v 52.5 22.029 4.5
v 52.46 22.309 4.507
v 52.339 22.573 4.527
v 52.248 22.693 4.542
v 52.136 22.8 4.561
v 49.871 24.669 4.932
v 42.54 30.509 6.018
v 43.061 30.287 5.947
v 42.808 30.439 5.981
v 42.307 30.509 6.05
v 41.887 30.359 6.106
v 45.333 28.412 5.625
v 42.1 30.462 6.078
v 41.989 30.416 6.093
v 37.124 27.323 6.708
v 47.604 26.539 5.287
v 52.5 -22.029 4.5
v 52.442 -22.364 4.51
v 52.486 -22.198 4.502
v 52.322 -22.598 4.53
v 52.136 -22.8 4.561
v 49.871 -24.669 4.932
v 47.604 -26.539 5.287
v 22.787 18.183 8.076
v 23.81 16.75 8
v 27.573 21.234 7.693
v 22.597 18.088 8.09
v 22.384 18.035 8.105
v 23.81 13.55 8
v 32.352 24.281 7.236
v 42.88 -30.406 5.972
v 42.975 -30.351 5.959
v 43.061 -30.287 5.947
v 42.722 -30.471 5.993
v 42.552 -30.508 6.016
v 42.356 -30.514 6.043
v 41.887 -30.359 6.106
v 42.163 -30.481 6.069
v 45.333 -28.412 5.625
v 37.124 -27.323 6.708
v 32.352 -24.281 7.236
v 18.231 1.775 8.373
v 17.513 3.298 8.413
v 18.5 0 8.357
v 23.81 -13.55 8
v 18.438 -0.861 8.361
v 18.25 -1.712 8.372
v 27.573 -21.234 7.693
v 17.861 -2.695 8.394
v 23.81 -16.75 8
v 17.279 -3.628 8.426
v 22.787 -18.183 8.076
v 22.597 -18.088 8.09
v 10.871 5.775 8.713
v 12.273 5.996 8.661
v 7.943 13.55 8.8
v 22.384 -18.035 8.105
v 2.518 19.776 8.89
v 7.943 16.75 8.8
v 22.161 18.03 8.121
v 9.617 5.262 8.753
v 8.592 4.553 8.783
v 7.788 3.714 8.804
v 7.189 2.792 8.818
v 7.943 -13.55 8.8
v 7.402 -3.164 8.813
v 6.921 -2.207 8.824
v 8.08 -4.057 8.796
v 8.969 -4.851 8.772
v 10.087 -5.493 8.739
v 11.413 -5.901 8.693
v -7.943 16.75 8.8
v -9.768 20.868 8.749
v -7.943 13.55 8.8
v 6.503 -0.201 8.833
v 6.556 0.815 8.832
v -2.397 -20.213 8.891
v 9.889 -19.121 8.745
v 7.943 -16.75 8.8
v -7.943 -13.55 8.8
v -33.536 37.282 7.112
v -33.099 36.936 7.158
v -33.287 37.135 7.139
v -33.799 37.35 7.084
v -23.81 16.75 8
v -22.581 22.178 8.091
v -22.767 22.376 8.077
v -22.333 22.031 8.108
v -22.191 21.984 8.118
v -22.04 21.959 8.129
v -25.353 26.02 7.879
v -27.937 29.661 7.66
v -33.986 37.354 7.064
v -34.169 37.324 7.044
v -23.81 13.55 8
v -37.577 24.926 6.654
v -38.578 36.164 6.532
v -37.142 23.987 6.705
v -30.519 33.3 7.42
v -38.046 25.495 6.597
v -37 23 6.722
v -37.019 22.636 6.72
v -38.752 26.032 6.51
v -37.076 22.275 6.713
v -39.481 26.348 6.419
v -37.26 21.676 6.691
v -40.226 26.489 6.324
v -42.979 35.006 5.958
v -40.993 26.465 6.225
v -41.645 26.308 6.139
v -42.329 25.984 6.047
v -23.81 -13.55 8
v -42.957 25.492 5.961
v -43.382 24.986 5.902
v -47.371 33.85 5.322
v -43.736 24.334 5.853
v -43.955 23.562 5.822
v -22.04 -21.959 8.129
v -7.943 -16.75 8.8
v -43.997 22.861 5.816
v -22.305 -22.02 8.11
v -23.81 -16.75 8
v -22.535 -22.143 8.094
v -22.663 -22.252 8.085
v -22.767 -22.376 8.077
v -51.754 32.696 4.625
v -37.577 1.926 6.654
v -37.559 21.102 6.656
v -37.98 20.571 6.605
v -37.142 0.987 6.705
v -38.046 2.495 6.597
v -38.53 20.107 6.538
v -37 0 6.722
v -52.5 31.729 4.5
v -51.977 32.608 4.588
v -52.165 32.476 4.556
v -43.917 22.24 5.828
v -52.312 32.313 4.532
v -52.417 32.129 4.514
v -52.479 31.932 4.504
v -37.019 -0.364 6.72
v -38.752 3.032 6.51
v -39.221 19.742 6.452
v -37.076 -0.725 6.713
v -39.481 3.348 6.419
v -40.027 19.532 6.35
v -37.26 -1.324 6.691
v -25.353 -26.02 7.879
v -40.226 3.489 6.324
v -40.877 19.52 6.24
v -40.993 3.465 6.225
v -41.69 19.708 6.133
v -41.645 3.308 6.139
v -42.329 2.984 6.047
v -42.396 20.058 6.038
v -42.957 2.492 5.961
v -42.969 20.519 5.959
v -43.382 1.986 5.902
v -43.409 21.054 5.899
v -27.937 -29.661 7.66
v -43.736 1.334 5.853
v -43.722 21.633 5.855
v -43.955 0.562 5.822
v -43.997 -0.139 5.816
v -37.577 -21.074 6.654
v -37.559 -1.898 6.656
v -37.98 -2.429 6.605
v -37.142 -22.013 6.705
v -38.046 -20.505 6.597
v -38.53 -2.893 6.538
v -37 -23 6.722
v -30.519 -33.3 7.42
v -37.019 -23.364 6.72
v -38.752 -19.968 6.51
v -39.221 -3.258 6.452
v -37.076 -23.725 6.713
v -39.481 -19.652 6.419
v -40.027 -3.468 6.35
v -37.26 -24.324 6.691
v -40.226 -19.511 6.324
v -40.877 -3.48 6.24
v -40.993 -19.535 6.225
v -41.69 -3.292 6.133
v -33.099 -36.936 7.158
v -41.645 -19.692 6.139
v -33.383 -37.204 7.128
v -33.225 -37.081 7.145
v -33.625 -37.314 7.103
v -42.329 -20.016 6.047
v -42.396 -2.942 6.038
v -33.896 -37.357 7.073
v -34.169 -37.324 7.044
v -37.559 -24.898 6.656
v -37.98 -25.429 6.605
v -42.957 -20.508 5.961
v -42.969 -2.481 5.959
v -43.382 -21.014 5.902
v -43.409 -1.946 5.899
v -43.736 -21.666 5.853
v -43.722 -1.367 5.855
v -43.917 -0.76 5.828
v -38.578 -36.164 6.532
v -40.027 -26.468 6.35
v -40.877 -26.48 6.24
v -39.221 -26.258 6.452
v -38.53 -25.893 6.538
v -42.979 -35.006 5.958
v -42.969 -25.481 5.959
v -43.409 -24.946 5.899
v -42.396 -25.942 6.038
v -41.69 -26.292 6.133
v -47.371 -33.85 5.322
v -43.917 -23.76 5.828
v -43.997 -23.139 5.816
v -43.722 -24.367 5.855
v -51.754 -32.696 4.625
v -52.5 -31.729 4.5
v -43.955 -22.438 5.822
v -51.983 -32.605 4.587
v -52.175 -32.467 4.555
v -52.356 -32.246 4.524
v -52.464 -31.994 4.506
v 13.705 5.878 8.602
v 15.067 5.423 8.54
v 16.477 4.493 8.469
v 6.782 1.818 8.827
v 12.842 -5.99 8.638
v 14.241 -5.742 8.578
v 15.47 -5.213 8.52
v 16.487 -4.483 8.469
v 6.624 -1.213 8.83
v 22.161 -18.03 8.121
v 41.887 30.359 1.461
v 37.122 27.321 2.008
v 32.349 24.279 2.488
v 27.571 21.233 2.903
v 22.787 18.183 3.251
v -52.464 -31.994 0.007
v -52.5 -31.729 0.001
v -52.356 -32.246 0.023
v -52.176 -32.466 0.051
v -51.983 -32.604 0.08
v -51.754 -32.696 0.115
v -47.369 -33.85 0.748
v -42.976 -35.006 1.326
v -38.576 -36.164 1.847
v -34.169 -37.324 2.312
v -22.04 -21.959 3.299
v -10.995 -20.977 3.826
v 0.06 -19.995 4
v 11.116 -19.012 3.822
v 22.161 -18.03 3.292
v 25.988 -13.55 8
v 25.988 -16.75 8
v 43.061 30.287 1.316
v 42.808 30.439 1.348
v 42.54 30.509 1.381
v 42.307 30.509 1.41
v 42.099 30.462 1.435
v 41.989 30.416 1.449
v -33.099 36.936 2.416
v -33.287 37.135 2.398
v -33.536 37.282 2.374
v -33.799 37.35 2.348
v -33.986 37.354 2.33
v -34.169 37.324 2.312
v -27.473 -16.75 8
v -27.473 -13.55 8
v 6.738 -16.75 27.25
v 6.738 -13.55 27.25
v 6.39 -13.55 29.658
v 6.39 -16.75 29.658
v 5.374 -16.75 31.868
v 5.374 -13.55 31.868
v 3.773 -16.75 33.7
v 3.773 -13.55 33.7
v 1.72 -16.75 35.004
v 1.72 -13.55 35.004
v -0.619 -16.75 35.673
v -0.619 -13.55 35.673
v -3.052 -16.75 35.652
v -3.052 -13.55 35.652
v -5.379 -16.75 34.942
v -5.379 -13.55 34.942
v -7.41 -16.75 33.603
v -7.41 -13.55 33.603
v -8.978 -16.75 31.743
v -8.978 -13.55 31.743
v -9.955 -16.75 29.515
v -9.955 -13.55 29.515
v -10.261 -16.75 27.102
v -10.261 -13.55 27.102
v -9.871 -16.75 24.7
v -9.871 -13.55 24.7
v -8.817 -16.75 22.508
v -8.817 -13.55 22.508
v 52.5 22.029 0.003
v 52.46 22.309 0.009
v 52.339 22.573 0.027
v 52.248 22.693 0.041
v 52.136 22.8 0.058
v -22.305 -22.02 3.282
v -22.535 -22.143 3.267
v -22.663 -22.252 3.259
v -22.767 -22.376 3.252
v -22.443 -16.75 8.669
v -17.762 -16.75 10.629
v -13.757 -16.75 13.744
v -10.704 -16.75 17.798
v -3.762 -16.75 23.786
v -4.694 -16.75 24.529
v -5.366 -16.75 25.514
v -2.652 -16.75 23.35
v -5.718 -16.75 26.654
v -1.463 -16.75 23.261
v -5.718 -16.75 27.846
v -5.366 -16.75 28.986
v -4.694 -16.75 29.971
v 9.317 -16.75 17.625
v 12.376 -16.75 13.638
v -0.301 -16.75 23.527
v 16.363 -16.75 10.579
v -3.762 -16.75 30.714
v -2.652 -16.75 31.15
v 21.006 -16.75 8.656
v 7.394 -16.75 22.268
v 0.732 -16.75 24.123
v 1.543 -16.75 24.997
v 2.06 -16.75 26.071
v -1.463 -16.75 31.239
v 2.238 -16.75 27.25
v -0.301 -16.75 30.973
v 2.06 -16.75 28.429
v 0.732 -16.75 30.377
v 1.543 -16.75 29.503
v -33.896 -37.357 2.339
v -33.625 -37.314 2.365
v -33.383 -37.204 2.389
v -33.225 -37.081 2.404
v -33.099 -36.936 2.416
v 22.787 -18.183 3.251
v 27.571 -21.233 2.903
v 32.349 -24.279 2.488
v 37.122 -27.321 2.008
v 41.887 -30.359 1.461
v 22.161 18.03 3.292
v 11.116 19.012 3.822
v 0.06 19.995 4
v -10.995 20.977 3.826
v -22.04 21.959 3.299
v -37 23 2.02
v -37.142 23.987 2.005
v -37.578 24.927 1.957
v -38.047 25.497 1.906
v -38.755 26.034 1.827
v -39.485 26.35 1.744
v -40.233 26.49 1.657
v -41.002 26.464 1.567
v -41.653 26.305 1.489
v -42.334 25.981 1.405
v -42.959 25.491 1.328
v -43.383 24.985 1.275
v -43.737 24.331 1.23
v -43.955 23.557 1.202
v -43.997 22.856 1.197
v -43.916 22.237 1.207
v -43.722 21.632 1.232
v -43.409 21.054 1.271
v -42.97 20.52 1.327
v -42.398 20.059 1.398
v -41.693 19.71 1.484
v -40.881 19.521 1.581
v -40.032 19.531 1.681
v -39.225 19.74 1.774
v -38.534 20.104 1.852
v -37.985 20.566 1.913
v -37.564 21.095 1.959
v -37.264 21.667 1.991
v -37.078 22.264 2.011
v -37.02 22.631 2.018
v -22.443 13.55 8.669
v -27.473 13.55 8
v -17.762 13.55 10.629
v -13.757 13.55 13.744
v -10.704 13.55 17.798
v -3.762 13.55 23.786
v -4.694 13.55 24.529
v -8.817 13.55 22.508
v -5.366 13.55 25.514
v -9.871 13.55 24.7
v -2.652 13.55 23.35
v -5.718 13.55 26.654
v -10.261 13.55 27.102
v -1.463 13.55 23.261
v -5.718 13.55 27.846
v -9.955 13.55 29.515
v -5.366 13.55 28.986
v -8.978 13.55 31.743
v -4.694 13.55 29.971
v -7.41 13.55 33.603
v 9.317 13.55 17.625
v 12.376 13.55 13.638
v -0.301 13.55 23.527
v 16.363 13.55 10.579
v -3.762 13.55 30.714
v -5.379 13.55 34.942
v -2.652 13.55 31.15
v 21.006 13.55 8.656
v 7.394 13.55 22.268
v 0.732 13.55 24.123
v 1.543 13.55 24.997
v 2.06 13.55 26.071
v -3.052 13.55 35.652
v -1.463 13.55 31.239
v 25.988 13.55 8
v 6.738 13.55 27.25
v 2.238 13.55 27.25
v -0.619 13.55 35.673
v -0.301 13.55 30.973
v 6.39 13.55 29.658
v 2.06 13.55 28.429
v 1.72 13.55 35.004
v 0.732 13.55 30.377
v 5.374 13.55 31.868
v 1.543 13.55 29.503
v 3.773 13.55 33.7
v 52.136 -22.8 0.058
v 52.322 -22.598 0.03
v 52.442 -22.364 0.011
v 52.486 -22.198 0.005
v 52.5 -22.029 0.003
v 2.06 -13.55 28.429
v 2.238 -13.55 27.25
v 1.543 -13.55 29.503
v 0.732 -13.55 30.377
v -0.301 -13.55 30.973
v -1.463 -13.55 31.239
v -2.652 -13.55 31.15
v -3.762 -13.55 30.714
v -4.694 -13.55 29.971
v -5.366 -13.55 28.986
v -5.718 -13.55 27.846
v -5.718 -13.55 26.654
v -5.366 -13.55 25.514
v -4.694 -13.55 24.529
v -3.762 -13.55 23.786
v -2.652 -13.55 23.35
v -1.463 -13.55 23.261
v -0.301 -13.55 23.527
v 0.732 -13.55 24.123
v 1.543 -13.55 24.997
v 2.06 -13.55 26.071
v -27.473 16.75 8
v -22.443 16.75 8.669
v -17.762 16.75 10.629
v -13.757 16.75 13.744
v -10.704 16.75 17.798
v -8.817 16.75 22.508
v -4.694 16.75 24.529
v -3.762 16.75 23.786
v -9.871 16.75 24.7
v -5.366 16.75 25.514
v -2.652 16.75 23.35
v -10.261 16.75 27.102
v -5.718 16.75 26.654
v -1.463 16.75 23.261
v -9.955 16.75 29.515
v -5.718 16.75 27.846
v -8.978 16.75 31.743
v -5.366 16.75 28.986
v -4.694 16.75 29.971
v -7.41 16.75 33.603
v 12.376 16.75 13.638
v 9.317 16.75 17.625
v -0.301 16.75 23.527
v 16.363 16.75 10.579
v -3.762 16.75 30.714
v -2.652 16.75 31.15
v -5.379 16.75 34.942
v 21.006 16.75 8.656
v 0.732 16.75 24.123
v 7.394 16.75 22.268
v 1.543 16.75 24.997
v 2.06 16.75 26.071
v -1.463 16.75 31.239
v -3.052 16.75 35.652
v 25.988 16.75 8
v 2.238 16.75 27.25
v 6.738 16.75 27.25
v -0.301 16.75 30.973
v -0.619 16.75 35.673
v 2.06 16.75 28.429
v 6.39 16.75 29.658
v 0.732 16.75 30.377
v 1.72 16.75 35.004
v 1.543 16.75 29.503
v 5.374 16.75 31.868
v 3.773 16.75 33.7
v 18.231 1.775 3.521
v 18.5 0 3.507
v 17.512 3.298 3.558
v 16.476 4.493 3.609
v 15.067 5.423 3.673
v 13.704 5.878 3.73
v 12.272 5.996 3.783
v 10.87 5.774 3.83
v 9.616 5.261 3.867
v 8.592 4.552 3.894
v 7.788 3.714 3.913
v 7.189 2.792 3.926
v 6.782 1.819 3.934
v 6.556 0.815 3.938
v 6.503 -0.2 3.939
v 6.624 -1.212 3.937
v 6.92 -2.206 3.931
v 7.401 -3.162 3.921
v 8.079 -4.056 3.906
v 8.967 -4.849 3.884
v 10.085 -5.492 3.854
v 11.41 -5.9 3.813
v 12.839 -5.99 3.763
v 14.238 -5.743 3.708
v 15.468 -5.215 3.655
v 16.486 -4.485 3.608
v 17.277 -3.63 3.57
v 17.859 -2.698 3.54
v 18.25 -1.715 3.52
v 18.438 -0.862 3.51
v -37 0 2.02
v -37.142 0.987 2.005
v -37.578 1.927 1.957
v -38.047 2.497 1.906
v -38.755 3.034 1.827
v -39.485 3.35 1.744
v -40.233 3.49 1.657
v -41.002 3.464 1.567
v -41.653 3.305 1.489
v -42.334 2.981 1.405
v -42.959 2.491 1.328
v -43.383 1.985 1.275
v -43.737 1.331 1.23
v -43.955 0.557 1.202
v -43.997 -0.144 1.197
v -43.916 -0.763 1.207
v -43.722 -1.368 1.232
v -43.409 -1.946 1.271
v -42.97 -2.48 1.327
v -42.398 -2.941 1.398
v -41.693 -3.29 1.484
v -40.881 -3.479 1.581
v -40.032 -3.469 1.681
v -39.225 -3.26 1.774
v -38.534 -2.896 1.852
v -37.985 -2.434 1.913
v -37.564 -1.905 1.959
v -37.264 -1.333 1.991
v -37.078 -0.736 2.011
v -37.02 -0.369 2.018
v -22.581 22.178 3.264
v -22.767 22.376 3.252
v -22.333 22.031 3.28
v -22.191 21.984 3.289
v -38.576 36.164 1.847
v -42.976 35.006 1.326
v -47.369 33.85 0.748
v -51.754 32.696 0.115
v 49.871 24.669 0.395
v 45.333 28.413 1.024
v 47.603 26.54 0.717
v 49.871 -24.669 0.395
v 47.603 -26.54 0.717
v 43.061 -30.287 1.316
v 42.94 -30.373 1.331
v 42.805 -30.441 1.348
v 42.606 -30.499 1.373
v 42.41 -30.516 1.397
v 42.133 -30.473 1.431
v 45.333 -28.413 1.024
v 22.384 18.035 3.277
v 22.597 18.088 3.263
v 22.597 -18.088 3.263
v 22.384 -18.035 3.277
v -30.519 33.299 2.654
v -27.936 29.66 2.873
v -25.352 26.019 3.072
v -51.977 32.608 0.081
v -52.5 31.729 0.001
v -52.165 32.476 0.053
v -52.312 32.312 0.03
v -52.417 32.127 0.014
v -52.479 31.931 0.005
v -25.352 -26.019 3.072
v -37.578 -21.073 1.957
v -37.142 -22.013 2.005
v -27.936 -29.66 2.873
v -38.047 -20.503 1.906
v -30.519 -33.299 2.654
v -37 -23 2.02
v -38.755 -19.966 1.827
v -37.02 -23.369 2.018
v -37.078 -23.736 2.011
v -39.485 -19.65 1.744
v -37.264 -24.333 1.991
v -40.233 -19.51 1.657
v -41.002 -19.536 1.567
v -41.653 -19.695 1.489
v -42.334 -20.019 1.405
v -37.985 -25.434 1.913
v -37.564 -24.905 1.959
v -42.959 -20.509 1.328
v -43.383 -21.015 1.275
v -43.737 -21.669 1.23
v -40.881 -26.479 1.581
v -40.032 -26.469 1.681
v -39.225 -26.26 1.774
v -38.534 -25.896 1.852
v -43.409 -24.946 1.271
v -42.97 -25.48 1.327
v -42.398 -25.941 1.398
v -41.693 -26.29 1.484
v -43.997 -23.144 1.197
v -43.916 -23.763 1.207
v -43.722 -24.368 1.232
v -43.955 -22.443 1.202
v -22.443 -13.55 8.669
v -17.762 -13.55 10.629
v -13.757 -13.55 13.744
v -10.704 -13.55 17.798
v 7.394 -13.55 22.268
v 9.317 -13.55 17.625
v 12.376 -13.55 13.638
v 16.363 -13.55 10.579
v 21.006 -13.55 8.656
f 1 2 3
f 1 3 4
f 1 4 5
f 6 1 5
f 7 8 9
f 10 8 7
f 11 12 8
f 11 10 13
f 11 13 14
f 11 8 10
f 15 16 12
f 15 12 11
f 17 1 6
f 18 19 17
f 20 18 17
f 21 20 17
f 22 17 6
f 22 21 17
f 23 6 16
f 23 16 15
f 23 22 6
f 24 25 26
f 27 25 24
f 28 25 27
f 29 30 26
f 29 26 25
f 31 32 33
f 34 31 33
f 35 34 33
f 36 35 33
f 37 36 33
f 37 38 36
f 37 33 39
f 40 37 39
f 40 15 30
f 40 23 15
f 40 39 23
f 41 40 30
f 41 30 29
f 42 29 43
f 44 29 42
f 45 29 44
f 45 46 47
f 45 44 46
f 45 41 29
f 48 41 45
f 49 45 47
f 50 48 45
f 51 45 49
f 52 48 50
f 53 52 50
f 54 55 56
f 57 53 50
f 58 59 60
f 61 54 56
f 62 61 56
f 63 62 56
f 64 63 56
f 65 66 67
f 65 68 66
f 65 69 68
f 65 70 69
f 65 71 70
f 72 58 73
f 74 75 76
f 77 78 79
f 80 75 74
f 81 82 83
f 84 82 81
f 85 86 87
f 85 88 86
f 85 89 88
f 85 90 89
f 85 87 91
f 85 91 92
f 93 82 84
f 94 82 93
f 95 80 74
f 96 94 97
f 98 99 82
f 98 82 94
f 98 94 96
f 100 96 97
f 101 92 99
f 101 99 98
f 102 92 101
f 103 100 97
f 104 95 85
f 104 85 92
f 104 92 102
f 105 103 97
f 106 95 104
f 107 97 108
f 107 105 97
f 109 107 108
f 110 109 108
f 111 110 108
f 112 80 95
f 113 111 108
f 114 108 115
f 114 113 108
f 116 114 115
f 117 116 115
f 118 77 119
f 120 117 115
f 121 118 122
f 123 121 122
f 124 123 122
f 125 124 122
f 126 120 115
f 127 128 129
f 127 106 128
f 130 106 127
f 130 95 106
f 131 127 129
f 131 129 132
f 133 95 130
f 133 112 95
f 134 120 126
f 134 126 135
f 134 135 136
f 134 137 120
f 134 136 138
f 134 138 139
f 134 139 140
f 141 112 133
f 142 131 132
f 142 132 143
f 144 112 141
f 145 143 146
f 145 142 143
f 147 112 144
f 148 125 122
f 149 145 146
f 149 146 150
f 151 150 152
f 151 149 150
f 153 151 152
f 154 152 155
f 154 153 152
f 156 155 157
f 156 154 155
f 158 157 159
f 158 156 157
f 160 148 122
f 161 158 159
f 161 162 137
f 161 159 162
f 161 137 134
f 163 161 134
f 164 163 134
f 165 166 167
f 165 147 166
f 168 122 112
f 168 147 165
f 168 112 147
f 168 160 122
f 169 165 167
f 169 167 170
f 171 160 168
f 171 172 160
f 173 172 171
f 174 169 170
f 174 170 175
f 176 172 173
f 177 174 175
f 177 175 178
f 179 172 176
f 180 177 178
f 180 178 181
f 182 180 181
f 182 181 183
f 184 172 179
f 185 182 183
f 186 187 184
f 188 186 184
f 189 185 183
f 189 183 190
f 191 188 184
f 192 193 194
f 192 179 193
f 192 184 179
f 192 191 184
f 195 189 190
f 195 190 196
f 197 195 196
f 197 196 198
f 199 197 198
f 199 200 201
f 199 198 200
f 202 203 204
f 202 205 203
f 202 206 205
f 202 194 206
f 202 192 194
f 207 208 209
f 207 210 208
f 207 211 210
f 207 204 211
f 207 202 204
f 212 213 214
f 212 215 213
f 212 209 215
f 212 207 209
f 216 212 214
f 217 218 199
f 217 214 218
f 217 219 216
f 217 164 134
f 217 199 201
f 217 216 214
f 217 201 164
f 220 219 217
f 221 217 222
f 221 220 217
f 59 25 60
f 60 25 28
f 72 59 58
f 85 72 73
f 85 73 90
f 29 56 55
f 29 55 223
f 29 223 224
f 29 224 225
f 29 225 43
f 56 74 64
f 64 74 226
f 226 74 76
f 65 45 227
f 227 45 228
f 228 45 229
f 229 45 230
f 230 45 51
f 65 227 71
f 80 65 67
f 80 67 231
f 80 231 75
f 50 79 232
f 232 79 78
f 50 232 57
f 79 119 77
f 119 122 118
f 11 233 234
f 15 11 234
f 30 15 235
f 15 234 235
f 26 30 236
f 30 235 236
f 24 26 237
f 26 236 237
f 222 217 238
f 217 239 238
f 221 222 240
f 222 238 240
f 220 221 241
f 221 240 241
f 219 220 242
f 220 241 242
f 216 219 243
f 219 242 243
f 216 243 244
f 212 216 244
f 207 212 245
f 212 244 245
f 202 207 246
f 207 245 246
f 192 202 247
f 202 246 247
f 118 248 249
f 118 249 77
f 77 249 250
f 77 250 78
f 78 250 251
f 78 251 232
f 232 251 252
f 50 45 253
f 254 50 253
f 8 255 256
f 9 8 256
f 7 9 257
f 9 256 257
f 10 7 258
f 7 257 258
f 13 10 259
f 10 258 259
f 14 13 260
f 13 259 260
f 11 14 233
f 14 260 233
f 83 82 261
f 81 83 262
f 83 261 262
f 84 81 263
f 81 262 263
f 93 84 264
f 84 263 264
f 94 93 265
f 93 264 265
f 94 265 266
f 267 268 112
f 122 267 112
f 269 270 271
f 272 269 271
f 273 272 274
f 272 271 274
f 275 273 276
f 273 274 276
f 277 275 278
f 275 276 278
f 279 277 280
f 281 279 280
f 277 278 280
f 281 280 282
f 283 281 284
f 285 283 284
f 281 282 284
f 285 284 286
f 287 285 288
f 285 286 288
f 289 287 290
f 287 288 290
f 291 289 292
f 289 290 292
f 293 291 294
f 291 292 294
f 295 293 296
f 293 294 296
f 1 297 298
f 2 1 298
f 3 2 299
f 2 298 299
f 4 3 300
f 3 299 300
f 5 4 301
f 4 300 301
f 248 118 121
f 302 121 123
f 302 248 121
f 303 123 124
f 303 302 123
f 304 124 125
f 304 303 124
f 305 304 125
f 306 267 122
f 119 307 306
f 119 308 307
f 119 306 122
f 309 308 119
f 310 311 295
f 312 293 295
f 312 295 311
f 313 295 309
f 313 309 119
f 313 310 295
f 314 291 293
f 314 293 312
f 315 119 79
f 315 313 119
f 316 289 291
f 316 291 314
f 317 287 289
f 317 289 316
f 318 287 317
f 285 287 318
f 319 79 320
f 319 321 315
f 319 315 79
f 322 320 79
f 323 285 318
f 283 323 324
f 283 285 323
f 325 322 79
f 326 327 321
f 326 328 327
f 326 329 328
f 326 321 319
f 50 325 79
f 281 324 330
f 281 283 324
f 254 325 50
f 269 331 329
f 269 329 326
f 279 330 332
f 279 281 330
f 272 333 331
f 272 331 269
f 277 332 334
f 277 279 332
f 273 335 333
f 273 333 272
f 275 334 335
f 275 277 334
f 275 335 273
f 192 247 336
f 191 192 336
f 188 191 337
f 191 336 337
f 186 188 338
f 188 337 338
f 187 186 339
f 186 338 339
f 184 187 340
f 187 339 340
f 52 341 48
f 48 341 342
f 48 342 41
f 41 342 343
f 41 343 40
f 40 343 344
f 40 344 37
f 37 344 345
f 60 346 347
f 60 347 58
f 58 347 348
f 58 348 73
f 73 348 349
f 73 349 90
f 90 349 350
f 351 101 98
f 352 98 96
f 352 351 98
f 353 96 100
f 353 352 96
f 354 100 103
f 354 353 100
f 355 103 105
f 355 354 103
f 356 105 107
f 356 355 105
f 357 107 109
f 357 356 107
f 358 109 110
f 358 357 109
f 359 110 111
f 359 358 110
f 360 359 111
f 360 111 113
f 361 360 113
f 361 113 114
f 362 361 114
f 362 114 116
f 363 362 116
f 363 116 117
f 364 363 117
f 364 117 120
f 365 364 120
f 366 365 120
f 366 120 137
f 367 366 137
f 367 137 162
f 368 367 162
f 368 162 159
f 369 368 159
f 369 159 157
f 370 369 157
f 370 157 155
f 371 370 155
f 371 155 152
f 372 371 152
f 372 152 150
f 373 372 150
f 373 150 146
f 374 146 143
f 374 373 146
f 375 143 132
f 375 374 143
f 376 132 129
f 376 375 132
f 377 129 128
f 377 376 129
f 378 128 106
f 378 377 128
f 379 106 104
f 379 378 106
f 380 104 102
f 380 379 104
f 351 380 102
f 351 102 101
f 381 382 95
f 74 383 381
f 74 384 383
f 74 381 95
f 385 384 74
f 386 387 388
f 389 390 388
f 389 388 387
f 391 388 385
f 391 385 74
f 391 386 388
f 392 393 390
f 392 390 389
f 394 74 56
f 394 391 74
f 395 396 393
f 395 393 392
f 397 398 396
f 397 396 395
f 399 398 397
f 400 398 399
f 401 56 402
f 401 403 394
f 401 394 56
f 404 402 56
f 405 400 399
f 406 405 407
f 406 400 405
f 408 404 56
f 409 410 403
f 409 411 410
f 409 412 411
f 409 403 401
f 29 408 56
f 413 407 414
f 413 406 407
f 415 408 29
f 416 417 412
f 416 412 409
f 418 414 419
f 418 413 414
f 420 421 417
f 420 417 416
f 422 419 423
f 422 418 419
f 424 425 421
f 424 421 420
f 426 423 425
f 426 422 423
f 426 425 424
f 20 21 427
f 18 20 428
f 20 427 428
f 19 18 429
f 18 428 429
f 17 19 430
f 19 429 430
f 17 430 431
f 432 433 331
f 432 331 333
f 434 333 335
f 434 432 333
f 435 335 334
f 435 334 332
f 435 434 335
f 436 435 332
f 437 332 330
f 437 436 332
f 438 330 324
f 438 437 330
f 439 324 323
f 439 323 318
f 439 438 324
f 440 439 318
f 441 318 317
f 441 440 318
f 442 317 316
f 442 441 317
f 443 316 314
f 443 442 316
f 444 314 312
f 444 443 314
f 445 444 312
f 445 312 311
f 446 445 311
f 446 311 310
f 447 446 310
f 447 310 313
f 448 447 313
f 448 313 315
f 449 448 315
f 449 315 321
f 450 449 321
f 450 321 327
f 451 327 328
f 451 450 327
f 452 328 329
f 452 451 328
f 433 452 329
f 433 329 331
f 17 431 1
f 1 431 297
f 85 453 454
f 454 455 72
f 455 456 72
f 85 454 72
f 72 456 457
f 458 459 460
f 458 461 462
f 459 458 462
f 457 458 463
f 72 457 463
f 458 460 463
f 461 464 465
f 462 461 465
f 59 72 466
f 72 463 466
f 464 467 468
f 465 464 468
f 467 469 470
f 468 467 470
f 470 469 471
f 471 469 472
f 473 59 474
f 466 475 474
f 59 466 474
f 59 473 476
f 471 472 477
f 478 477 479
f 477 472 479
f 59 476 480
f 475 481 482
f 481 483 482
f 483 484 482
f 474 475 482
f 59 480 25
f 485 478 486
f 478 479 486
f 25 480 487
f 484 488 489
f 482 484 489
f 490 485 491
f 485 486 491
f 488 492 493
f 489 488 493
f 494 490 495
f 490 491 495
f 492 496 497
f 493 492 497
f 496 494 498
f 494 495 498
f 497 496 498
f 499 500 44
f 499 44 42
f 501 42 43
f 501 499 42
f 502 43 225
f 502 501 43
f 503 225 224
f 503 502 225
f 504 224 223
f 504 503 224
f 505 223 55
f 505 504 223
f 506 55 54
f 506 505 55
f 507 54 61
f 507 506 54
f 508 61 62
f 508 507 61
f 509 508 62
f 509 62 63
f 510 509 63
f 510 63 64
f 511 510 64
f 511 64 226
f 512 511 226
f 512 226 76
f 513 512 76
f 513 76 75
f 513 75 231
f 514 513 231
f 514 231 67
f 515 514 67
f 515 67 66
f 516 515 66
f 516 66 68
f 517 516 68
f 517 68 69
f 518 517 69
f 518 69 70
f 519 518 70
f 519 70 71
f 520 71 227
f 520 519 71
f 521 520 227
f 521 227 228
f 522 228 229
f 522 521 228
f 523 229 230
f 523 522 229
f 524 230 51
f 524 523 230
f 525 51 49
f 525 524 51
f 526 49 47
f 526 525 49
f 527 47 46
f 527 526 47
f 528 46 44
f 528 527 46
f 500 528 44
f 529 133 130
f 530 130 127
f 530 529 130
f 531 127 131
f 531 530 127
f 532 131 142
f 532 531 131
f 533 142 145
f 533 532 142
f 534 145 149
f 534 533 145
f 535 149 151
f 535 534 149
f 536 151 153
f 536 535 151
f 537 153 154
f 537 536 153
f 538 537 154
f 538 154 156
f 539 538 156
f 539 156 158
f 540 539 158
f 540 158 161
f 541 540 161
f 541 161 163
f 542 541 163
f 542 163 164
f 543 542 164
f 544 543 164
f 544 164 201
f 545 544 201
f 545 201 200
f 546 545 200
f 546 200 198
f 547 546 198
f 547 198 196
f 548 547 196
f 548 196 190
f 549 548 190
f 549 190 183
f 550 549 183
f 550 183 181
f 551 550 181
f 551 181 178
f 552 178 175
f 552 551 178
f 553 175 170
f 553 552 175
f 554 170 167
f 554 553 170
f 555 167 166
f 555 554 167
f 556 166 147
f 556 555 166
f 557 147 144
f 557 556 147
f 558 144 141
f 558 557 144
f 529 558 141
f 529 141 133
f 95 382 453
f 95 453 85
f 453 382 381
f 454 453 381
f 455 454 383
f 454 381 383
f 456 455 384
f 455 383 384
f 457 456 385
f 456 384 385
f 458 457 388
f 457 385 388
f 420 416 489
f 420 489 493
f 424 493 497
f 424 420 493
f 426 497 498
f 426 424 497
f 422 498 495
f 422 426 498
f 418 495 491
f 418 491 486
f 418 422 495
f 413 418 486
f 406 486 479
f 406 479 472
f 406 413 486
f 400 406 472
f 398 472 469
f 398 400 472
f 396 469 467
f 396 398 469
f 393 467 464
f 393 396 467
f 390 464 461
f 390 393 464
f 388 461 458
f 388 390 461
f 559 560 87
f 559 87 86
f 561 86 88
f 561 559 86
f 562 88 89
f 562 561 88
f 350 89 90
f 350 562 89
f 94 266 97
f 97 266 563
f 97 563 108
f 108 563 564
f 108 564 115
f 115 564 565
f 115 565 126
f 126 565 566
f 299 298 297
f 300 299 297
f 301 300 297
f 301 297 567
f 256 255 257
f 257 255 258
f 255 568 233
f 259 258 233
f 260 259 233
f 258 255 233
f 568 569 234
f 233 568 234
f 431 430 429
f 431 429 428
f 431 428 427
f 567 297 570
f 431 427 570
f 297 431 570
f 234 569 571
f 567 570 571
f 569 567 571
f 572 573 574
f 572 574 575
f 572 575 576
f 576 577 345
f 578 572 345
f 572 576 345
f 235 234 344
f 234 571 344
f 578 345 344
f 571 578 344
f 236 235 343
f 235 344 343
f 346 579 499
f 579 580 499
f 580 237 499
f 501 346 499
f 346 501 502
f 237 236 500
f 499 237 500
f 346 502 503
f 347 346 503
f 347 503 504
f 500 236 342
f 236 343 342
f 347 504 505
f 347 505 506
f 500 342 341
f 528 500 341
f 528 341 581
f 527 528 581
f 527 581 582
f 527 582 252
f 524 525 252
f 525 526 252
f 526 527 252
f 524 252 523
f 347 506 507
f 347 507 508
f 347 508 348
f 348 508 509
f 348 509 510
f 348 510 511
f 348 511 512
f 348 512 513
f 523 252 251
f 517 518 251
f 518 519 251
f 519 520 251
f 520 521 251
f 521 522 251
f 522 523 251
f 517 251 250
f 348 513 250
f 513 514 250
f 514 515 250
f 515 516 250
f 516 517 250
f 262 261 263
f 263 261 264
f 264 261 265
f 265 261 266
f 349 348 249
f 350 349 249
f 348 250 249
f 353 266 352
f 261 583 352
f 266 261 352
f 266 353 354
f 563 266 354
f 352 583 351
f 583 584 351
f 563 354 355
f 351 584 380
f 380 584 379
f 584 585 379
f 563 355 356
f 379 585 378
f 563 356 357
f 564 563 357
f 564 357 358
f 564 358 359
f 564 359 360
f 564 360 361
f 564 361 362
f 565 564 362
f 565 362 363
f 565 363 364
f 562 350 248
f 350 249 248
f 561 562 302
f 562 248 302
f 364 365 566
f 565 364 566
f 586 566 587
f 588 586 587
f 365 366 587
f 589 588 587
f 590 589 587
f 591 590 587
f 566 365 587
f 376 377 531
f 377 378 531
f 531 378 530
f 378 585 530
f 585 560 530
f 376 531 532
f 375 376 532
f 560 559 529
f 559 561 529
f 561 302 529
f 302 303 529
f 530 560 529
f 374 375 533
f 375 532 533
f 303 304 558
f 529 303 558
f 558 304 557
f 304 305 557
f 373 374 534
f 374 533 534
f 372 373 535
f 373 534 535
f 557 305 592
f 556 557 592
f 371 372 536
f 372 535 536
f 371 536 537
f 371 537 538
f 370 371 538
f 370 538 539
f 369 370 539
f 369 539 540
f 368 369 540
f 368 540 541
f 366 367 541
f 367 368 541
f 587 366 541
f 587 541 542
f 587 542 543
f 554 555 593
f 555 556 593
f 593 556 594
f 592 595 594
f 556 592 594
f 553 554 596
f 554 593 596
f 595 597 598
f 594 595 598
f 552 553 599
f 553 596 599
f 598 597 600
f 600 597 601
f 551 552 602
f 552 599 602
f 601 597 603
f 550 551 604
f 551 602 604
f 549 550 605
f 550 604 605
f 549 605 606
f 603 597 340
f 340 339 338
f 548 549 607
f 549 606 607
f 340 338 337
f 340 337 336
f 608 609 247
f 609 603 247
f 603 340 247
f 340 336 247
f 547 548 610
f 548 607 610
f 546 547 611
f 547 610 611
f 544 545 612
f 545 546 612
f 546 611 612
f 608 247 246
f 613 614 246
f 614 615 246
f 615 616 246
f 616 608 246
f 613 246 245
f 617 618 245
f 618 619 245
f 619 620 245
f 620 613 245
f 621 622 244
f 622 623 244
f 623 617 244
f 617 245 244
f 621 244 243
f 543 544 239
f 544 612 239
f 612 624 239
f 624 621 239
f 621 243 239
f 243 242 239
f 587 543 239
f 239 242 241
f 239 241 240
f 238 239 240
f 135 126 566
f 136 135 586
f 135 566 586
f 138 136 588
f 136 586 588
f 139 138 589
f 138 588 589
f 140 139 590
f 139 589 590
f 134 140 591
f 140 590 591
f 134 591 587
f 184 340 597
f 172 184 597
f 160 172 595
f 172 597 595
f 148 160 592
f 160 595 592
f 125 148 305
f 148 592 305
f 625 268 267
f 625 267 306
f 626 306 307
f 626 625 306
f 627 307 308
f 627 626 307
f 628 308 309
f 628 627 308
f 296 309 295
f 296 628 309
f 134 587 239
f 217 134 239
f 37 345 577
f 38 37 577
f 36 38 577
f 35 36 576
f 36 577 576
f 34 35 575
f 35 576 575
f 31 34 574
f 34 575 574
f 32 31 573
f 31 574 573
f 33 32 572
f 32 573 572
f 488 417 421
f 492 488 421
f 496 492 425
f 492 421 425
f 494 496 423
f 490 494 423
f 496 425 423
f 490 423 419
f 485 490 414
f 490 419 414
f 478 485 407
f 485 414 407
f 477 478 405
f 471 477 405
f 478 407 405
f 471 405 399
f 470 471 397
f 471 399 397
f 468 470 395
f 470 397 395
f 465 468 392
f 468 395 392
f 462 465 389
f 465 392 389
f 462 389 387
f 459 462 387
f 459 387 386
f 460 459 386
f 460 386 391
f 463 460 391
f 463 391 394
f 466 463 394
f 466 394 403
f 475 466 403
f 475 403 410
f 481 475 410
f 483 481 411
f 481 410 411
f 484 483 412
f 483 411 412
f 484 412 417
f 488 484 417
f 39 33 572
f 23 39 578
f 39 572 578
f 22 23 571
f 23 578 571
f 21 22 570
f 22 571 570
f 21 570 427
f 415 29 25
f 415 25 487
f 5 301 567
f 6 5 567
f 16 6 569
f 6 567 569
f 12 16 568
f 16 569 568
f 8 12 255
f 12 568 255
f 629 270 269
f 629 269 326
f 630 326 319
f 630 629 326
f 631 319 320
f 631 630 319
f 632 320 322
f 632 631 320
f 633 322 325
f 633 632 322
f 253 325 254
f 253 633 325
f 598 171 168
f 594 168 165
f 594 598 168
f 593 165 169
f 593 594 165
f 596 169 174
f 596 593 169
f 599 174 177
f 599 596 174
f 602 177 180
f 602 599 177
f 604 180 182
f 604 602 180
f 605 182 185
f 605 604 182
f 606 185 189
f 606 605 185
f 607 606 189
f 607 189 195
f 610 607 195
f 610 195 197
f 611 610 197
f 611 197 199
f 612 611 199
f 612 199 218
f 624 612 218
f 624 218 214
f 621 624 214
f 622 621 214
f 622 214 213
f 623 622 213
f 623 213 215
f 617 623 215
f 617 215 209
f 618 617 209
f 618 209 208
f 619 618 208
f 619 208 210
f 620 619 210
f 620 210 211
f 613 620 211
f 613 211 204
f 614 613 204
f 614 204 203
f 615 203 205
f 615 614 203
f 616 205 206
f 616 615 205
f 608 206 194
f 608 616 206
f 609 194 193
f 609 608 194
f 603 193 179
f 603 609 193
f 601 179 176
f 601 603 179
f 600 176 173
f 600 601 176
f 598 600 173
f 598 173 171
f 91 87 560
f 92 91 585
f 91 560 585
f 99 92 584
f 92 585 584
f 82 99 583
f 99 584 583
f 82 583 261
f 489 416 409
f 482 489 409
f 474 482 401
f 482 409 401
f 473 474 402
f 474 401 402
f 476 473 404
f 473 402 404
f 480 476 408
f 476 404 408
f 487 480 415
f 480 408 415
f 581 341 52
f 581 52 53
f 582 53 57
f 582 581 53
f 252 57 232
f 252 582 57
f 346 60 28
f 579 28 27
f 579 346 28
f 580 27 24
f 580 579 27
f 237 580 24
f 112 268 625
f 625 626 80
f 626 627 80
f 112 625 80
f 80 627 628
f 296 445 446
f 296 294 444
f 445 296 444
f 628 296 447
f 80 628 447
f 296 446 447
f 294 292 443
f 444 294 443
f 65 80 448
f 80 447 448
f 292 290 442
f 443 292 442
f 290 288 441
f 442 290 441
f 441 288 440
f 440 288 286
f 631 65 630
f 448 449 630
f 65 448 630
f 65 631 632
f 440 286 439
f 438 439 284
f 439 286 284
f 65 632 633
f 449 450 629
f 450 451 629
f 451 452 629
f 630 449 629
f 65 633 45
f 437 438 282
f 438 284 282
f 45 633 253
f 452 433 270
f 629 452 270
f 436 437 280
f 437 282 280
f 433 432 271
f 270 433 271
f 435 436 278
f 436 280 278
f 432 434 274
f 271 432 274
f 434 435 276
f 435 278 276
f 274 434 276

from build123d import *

# Parameters (mm, degrees)
SKETCH_R        = 3.5
SKETCH_R_2      = 6
PAD_DEPTH       = 9
POCKET001_DEPTH = 75
POCKET_DEPTH    = 75
SKETCH003_R     = 4
PAD001_DEPTH    = 3.2


with BuildPart() as part:
    # Sketch → Pad (new body)
    with BuildSketch(Plane.XY):
        with BuildLine():
            Line((-34.169398, 37.323843), (-51.754493, 32.696186))
            ThreePointArc((-51.754493, 32.696186), (-52.291989, 32.339647), (-52.5, 31.729111))
            Line((-52.5, 31.729111), (-52.5, -31.729111))
            ThreePointArc((-52.5, -31.729111), (-52.291989, -32.339647), (-51.754493, -32.696186))
            Line((-51.754493, -32.696186), (-34.169398, -37.323843))
            ThreePointArc((-34.169398, -37.323843), (-33.573754, -37.296777), (-33.099398, -36.935515))
            Line((-33.099398, -36.935515), (-22.767161, -22.376454))
            ThreePointArc((-22.040194, -21.959128), (-22.449515, -22.087944), (-22.767161, -22.376454))
            Line((-22.040194, -21.959128), (22.160937, -18.030139))
            ThreePointArc((22.787034, -18.182984), (22.486636, -18.054741), (22.160937, -18.030139))
            Line((22.787034, -18.182984), (41.886908, -30.359154))
            ThreePointArc((41.886908, -30.359154), (42.485559, -30.514059), (43.060848, -30.2873))
            Line((43.060848, -30.2873), (52.136383, -22.799984))
            ThreePointArc((52.136383, -22.799984), (52.404539, -22.455001), (52.5, -22.028611))
            Line((52.5, -22.028611), (52.5, 22.028611))
            ThreePointArc((52.5, 22.028611), (52.404539, 22.455001), (52.136383, 22.799984))
            Line((52.136383, 22.799984), (43.060848, 30.2873))
            ThreePointArc((43.060848, 30.2873), (42.485559, 30.514059), (41.886908, 30.359154))
            Line((41.886908, 30.359154), (22.787034, 18.182984))
            ThreePointArc((22.160937, 18.030139), (22.486636, 18.054741), (22.787034, 18.182984))
            Line((22.160937, 18.030139), (-22.040194, 21.959128))
            ThreePointArc((-22.767161, 22.376454), (-22.449515, 22.087944), (-22.040194, 21.959128))
            Line((-22.767161, 22.376454), (-33.099398, 36.935515))
            ThreePointArc((-33.099398, 36.935515), (-33.573754, 37.296777), (-34.169398, 37.323843))
        make_face()
        with Locations((-40.5, 0)):
            Circle(SKETCH_R, mode=Mode.SUBTRACT)
        with Locations((-40.5, 23)):
            Circle(SKETCH_R, mode=Mode.SUBTRACT)
        with Locations((-40.5, -23)):
            Circle(SKETCH_R, mode=Mode.SUBTRACT)
        with Locations((12.5, 0)):
            Circle(SKETCH_R_2, mode=Mode.SUBTRACT)
    extrude(amount=PAD_DEPTH)

    # Sketch006 → Pocket001 (cut)
    with BuildSketch(Plane.XZ.offset(37.5)):
        with BuildLine():
            ThreePointArc((52.5, 4.5), (0, 8.9), (-52.5, 4.5))
            Line((-52.5, 4.5), (-52.5, 9))
            Line((52.5, 9), (-52.5, 9))
            Line((52.5, 4.5), (52.5, 9))
        make_face()
    extrude(amount=-POCKET001_DEPTH, mode=Mode.SUBTRACT)

    # Sketch005 → Pocket (cut)
    with BuildSketch(Plane.XZ.offset(37.5)):
        with BuildLine():
            ThreePointArc((52.516865, 0), (0.003551, 4.000338), (-52.509762, 0))
            Line((-52.509762, 0), (52.516865, 0))
        make_face()
    extrude(amount=-POCKET_DEPTH, mode=Mode.SUBTRACT)

    # Sketch003 (on DatumPlane) → Pad001 (join)
    with BuildSketch(Plane.XZ.offset(13.55)):
        with BuildLine():
            ThreePointArc((6.737796, 27.25), (-4.240883, 35.380569), (-8.816593, 22.508102))
            ThreePointArc((-27.473413, 8), (-15.656455, 12.053882), (-8.816593, 22.508102))
            Line((-27.473413, 8), (25.987796, 8))
            ThreePointArc((6.737796, 27.25), (12.37599, 13.638194), (25.987796, 8))
        make_face()
        with Locations((-1.762204, 27.25)):
            Circle(SKETCH003_R, mode=Mode.SUBTRACT)
    pad001 = extrude(amount=PAD001_DEPTH)

    # Mirrored: Pad001 across XZ
    add(pad001.mirror(Plane.XZ))


solid = part.part
